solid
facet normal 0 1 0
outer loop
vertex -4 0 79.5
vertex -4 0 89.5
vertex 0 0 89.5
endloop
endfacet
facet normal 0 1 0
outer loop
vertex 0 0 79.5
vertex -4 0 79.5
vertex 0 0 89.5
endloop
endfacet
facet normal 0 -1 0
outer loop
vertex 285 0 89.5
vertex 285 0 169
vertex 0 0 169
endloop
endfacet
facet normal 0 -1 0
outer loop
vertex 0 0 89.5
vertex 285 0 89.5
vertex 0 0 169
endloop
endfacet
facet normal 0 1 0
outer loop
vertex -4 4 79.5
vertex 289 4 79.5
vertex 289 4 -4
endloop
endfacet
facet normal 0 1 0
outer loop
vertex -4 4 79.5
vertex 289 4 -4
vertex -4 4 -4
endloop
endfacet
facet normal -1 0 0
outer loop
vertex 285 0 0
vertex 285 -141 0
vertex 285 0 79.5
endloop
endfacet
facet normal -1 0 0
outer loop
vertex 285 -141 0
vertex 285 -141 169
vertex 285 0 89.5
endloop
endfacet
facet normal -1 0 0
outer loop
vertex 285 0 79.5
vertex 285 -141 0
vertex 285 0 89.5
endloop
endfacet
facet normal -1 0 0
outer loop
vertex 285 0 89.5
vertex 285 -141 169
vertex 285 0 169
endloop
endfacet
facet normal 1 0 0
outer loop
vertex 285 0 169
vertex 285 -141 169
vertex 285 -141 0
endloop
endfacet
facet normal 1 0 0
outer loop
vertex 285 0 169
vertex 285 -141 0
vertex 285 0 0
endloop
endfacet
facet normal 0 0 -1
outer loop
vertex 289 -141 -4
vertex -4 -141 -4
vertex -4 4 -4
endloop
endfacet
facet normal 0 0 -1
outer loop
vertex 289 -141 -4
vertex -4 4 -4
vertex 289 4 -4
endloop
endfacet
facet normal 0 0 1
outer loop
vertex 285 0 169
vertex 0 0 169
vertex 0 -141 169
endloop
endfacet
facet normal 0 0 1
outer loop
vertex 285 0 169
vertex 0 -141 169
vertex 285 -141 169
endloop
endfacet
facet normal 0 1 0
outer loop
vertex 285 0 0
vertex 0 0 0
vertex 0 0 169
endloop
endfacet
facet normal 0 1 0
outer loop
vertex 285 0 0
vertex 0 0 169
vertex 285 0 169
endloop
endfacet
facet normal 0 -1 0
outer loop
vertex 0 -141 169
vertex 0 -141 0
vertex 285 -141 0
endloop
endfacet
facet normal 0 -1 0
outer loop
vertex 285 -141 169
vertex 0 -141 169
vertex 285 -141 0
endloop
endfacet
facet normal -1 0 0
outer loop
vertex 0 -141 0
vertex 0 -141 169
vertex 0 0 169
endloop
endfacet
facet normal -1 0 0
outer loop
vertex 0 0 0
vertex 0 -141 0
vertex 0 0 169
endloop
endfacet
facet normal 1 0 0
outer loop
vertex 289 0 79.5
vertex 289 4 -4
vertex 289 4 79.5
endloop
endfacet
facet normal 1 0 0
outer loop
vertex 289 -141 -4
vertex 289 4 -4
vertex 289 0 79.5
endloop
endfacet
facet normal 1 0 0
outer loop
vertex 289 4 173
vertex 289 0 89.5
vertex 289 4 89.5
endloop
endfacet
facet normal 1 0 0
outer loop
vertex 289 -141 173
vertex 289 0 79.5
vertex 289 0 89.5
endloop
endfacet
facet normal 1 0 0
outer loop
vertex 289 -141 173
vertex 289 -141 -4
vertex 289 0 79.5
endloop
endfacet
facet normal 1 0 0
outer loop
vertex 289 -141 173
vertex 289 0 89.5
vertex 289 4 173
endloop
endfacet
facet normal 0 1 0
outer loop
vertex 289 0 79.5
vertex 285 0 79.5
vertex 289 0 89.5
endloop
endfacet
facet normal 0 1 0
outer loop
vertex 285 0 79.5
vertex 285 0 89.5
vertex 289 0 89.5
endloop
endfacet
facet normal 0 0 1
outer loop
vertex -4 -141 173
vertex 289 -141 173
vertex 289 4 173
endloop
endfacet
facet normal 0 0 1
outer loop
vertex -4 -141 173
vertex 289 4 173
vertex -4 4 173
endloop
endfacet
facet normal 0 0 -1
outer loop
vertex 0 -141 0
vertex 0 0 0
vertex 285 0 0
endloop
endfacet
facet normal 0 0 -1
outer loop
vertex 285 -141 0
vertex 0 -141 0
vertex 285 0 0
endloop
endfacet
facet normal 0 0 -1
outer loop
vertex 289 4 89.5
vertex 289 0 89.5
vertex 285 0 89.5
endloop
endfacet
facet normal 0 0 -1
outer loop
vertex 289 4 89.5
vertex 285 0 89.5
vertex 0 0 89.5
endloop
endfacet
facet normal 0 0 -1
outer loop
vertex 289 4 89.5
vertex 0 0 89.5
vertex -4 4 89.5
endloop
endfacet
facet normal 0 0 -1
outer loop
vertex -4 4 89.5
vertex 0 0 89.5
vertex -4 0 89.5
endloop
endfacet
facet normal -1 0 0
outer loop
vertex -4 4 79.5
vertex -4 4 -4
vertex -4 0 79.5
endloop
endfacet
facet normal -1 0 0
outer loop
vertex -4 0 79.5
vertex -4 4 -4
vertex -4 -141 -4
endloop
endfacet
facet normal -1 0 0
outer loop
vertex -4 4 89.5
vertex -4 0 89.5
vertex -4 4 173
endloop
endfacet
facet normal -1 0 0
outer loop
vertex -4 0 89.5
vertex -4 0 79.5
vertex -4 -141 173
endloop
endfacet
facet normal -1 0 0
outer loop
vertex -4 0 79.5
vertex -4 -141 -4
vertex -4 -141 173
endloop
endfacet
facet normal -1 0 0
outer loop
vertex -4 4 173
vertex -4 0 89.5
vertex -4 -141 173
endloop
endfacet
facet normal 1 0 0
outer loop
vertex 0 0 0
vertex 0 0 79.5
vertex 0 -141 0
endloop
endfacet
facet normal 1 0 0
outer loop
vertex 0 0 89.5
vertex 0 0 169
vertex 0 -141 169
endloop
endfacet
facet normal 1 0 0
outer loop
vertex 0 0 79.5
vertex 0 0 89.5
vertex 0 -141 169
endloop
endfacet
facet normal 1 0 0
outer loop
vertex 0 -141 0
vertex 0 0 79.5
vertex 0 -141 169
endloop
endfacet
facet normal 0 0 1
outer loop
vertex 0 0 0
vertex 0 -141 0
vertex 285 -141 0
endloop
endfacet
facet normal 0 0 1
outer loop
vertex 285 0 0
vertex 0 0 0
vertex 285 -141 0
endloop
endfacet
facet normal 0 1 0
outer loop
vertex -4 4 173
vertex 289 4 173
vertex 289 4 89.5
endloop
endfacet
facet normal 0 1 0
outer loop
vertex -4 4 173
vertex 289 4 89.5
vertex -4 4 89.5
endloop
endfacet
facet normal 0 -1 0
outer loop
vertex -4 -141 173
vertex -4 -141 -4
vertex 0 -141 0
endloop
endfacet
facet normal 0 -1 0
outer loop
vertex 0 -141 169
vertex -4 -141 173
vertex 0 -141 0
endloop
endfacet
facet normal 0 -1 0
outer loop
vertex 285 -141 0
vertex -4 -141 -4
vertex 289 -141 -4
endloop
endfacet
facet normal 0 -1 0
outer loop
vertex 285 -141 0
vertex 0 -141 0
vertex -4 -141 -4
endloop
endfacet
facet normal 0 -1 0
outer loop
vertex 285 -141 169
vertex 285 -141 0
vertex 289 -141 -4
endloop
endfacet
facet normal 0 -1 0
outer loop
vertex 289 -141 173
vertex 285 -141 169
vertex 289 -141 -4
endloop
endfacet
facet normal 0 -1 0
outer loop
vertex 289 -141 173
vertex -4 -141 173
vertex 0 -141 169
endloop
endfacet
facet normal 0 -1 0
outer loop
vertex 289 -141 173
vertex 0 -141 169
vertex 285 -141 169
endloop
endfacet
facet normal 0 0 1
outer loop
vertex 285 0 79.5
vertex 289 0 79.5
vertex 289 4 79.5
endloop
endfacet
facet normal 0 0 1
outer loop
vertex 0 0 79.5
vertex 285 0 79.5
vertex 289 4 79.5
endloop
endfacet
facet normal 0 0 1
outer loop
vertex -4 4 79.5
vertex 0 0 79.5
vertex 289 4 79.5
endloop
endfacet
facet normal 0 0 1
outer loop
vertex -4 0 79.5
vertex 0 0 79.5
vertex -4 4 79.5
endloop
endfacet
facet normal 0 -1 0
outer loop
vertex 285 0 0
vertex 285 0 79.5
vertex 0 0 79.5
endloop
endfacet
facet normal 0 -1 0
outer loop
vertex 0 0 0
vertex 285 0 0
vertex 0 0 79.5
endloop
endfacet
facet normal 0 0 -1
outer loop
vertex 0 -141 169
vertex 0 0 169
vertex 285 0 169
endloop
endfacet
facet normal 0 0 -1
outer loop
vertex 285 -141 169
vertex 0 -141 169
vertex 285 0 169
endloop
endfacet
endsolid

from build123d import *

# Parameters (mm, degrees)
F0_W      = 285
F0_H      = 141
F1_DEPTH  = 169
F2_W      = 141
F2_H      = 169
F3_DEPTH  = 4
F4_W      = 141
F4_H      = 169
F5_DEPTH  = 4
F6_W      = 293
F6_H      = 141
F7_DEPTH  = 4
F8_W      = 293
F8_H      = 141
F9_DEPTH  = 4
F10_W     = 293
F10_H     = 83.5
F11_DEPTH = 4


with BuildPart() as f1:
    # F0 (on Top) → F1 (new body)
    with BuildSketch(Plane.XY):
        with Locations((142.5, -70.5)):
            Rectangle(F0_W, F0_H)
    extrude(amount=F1_DEPTH)


with BuildPart() as f3:
    # F2 (on face) → F3 (new body)
    with BuildSketch(Plane.YZ.offset(285)):
        with Locations((-70.5, 84.5)):
            Rectangle(F2_W, F2_H)
    extrude(amount=F3_DEPTH)



with BuildPart() as f5:
    # F4 (on face) → F5 (new body)
    with BuildSketch(Plane(origin=(0, 0, 0), x_dir=(0, -1, 0), z_dir=(-1, 0, 0))):
        with Locations((70.5, 84.5)):
            Rectangle(F4_W, F4_H)
    extrude(amount=F5_DEPTH)


with BuildPart() as f3_1:
    add(f3.part)

    add(f5.part)  # F7 merges F5
    # F6 (on face) → F7 (join)
    with BuildSketch(Plane.XY.offset(169)):
        with Locations((142.5, -70.5)):
            Rectangle(F6_W, F6_H)
    extrude(amount=F7_DEPTH)



with BuildPart() as f9:
    # F8 (on face) → F9 (new body)
    with BuildSketch(Plane(origin=(0, 0, 0), x_dir=(1, 0, 0), z_dir=(0, 0, -1))):
        with Locations((142.5, 70.5)):
            Rectangle(F8_W, F8_H)
    extrude(amount=F9_DEPTH)


with BuildPart() as f3_2:
    add(f3_1.part)

    add(f9.part)  # F11 merges F9
    # F10 (on face) → F11 (join)
    with BuildSketch(Plane(origin=(0, 0, 0), x_dir=(-1, 0, 0), z_dir=(0, 1, 0))):
        with Locations((-142.5, 131.25)):
            Rectangle(F10_W, F10_H)
        with Locations((-142.5, 37.75)):
            Rectangle(F10_W, F10_H)
    extrude(amount=F11_DEPTH)


solid = Compound([f1.part, f3_2.part])
